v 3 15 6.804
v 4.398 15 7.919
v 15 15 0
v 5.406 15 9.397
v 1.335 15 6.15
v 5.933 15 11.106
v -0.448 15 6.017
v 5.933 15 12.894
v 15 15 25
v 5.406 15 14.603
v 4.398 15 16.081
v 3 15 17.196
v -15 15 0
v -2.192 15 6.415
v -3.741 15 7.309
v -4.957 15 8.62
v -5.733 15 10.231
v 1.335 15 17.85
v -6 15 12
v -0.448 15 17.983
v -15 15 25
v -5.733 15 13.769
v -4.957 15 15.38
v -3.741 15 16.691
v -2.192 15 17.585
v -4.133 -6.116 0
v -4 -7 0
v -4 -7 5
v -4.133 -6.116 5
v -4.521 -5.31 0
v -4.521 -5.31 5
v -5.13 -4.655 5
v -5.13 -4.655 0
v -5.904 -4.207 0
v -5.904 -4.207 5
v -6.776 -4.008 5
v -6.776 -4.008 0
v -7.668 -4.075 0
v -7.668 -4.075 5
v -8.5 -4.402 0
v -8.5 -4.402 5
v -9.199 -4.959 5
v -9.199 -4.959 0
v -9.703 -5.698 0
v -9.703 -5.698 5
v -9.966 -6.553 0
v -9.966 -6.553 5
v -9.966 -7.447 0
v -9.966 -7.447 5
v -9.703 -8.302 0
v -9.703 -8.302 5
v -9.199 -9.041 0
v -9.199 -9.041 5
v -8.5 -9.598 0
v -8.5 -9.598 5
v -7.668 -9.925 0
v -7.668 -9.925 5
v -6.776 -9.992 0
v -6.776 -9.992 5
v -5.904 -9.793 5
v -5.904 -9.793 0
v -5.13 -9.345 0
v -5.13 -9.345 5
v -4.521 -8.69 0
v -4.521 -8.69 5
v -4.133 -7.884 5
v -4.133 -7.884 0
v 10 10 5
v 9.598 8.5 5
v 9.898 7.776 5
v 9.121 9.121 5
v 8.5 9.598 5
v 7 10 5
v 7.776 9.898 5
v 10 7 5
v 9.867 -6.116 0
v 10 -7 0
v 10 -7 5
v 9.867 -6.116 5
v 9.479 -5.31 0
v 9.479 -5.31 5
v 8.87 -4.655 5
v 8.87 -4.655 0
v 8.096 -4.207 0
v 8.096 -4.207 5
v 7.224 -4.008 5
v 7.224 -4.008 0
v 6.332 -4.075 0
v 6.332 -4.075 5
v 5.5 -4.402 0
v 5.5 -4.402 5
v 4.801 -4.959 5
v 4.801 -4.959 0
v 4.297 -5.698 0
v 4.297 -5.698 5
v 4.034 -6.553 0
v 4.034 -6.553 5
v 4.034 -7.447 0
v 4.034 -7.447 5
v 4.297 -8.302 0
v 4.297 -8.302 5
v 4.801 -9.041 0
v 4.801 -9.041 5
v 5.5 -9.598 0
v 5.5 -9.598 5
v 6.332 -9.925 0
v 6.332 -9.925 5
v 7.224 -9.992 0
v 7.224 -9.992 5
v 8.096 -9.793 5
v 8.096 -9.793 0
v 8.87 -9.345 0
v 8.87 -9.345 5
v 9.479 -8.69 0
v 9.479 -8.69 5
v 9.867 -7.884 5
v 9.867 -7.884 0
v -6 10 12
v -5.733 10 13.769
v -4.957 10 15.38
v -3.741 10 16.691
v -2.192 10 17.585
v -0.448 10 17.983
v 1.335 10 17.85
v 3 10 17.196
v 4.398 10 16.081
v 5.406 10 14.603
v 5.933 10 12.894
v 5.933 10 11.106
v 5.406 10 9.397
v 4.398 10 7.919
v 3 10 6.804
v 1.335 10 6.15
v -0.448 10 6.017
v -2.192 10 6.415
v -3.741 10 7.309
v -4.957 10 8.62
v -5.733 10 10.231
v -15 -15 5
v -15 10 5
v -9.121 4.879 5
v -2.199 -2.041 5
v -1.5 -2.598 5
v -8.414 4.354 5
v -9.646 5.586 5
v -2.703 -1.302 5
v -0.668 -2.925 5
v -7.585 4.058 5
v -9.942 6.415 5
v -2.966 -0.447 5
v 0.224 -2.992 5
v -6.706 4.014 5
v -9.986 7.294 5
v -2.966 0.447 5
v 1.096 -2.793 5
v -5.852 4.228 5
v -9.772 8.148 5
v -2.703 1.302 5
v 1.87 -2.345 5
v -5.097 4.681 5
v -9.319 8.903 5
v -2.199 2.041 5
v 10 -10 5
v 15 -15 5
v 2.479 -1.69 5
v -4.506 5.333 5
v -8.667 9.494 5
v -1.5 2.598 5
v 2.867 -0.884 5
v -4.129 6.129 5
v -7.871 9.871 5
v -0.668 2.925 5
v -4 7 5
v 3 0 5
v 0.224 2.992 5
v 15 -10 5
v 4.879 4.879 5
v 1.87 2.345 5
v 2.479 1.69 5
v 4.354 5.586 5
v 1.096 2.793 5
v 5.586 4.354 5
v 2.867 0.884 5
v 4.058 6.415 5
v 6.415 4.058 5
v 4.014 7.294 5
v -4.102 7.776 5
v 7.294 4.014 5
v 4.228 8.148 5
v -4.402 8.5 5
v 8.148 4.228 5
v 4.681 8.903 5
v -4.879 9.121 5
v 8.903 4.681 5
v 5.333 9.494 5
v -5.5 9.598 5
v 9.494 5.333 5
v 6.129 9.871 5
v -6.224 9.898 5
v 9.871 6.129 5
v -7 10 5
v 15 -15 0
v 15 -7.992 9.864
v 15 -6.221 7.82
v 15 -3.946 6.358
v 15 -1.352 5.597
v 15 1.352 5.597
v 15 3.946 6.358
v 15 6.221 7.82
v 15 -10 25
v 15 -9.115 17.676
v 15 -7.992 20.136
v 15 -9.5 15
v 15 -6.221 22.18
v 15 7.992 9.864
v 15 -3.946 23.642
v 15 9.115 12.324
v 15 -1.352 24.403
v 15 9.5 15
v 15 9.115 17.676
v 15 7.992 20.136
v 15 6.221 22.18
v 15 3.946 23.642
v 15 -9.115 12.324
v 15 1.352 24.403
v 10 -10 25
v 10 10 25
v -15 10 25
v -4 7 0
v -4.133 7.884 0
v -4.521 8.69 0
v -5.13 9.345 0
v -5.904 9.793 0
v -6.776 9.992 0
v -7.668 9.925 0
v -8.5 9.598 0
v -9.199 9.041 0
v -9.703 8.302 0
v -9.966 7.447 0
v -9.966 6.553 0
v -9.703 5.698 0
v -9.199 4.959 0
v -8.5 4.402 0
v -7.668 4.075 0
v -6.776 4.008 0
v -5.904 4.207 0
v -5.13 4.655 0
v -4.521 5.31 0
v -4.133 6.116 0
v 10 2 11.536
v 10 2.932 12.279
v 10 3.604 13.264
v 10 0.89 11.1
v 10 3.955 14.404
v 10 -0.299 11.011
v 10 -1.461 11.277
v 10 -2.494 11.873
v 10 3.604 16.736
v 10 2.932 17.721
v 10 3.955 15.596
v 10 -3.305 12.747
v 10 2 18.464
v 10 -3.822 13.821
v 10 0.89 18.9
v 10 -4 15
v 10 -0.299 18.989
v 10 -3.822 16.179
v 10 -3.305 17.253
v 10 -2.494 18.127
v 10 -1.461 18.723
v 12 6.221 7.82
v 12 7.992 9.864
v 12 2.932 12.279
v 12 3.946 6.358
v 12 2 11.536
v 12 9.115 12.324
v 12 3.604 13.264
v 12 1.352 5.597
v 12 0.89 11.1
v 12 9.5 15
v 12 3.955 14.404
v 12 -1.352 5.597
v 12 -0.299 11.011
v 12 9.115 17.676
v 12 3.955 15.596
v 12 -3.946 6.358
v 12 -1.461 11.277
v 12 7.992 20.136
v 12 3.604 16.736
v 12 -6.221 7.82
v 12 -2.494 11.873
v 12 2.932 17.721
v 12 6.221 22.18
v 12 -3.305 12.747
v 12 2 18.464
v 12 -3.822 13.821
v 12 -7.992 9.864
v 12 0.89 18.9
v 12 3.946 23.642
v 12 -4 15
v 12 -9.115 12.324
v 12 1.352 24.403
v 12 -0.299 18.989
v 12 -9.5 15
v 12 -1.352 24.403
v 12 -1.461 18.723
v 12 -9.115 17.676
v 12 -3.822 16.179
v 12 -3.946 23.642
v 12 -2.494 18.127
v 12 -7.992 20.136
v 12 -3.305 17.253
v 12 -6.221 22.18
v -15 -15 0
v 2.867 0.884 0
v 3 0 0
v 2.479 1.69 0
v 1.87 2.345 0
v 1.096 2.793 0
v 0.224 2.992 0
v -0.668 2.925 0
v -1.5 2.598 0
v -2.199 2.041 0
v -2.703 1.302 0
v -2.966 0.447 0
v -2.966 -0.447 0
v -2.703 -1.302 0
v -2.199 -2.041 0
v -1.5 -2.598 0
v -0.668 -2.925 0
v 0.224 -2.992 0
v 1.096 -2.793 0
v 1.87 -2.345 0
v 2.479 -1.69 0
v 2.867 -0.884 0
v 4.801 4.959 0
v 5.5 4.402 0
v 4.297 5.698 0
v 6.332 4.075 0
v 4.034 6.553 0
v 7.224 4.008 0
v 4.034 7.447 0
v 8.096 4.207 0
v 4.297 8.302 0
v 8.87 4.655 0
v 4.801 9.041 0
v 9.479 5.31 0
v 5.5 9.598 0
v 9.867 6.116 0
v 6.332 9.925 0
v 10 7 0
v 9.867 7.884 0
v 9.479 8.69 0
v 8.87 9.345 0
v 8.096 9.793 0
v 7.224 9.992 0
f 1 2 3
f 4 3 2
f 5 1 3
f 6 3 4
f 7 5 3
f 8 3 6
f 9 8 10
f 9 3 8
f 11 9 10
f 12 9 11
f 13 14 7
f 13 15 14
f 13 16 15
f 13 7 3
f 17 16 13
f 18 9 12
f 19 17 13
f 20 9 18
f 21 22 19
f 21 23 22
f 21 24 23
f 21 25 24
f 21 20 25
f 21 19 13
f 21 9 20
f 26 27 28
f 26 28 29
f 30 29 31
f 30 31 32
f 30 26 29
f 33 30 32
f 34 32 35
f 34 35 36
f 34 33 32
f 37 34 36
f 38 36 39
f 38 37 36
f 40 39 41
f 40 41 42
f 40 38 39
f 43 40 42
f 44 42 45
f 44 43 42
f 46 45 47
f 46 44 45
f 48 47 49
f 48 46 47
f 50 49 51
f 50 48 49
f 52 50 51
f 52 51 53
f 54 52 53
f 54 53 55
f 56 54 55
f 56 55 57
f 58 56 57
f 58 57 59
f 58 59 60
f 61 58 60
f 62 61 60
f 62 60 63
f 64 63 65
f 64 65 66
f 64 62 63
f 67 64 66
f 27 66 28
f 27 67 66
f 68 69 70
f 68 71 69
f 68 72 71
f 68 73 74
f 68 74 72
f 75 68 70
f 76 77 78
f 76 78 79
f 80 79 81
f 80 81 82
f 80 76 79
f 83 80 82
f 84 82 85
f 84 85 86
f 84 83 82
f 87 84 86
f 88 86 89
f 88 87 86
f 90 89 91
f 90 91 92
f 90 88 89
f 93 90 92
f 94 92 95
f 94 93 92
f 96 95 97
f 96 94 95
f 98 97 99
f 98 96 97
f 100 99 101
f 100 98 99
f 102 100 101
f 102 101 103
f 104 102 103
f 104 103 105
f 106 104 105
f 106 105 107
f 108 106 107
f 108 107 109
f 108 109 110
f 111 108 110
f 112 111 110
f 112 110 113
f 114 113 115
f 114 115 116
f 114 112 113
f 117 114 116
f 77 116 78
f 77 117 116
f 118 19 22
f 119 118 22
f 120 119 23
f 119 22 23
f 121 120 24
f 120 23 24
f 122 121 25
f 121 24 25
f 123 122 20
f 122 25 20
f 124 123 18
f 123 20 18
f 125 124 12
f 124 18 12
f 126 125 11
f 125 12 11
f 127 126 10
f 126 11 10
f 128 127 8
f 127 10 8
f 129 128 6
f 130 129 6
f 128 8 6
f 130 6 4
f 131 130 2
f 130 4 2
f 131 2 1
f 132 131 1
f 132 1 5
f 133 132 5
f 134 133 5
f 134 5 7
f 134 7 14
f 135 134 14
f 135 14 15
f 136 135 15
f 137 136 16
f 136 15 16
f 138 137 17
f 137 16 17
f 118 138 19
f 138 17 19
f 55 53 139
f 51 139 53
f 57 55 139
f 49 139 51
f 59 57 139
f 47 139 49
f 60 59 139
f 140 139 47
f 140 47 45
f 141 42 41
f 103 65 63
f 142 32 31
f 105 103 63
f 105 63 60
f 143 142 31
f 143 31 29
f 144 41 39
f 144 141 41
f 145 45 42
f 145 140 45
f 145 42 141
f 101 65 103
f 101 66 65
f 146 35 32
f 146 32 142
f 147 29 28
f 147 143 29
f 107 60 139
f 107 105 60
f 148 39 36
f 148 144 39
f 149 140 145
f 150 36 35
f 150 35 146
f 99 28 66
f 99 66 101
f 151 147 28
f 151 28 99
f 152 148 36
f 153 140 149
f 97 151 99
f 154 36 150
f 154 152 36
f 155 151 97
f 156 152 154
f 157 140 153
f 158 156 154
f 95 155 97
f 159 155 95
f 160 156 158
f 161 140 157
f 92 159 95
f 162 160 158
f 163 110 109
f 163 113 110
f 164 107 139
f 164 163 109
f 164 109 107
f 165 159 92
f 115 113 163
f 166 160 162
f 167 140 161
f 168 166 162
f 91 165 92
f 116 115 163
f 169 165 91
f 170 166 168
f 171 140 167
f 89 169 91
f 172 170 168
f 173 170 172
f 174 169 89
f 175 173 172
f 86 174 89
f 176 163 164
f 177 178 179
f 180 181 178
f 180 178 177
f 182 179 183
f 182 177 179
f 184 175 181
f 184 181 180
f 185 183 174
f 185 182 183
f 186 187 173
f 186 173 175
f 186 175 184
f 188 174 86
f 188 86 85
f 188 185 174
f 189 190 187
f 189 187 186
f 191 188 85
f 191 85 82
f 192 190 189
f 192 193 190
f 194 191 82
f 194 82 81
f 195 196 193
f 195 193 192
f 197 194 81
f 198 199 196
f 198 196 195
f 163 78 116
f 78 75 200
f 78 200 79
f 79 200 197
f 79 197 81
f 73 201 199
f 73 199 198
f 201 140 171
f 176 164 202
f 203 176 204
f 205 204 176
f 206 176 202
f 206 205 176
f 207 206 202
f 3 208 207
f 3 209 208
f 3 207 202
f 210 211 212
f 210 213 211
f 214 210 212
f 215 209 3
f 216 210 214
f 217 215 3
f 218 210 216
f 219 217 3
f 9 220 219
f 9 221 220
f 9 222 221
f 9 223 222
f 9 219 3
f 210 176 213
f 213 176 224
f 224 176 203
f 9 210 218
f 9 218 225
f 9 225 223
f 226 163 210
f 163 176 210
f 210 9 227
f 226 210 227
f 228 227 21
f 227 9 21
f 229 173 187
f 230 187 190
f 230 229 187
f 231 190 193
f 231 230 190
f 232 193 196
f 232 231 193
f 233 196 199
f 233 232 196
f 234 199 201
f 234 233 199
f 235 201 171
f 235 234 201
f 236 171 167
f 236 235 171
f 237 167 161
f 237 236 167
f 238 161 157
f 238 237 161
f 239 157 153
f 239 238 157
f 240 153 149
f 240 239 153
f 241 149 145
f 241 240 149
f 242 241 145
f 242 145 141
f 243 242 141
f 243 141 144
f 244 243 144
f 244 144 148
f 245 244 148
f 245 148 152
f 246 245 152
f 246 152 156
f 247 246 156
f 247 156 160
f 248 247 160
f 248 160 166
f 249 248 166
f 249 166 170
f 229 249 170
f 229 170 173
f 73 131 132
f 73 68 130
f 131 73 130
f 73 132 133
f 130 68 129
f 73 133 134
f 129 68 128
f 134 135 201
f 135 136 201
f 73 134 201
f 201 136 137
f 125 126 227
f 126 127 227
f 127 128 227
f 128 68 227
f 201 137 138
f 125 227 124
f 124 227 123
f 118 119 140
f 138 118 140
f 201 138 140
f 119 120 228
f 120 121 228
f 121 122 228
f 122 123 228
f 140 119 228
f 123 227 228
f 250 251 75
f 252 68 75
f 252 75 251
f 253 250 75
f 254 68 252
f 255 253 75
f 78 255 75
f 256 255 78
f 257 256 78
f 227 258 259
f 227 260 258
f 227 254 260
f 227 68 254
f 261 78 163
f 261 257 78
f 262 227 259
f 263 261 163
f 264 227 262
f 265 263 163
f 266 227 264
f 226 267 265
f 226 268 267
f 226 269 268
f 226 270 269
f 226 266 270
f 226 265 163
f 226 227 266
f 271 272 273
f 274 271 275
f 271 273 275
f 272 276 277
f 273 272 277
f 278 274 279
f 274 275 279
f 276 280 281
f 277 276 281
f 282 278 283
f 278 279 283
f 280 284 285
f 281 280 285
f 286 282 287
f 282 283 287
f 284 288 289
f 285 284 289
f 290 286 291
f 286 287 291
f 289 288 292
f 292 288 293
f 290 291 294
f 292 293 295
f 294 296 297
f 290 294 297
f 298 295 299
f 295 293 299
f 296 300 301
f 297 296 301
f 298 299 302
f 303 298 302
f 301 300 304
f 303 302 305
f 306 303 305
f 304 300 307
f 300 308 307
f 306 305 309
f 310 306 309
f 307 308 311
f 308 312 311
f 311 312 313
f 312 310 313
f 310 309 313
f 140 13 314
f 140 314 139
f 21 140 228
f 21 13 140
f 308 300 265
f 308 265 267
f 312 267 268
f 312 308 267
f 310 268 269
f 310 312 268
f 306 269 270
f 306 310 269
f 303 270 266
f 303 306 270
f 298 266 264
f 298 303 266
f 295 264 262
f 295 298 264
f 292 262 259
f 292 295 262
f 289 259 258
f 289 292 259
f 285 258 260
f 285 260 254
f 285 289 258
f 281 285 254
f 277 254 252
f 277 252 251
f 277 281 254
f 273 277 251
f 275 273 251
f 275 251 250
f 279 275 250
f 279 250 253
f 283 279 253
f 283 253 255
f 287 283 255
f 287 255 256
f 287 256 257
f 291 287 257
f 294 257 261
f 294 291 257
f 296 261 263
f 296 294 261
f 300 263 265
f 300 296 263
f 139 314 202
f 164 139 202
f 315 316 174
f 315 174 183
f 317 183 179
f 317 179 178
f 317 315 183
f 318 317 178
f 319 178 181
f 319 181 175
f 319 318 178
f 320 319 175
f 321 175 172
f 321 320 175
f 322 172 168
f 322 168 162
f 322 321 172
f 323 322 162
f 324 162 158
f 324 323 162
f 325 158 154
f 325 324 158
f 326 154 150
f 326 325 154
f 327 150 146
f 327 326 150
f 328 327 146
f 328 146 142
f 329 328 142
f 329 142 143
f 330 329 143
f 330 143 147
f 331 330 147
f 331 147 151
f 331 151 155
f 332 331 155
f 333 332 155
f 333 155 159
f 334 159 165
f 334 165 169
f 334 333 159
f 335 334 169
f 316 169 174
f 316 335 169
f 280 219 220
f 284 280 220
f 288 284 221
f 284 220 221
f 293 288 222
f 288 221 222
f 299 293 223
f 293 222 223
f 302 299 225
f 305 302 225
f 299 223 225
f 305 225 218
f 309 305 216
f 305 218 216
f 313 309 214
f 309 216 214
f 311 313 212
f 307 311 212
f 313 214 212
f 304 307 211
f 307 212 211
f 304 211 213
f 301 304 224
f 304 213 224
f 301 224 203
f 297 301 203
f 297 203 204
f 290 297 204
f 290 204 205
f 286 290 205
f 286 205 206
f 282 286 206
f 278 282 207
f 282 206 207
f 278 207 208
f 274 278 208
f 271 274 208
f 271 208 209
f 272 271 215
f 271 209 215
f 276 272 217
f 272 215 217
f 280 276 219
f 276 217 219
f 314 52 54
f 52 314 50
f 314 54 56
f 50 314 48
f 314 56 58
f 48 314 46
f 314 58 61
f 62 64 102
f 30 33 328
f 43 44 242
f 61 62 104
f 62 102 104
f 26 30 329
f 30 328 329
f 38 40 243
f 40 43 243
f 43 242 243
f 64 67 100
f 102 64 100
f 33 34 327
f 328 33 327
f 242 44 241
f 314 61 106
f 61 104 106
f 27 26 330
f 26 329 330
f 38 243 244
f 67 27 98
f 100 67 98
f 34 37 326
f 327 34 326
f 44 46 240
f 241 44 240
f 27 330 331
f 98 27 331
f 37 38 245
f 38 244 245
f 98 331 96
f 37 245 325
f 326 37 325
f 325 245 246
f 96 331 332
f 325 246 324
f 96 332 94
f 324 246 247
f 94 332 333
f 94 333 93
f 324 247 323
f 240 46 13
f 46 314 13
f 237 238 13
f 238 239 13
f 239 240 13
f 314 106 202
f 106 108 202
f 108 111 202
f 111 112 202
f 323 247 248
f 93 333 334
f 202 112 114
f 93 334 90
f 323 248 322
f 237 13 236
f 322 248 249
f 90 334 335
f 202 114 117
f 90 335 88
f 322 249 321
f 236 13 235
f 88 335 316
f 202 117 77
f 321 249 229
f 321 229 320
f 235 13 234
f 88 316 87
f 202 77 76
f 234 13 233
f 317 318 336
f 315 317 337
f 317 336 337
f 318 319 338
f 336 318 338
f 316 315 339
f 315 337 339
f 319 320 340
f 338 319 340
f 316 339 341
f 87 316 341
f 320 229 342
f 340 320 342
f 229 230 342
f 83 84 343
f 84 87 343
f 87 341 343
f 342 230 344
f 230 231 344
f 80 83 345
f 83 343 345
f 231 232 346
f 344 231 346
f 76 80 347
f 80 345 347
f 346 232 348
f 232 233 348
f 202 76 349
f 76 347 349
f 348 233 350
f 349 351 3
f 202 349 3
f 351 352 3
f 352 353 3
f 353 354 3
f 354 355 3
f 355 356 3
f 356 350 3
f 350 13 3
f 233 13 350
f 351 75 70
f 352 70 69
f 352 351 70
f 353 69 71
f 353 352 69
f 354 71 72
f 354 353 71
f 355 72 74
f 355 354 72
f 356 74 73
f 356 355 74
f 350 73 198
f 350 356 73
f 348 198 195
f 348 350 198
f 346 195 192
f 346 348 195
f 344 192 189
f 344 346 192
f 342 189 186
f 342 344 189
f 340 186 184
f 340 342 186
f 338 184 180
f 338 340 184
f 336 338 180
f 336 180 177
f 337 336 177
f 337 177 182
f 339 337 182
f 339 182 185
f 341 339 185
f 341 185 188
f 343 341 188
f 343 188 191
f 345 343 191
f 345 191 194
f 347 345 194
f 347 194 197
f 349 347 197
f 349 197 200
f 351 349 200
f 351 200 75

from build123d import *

# Parameters (mm, degrees)
F0_W     = 30
F0_H     = 30
F0_R     = 3
F1_DEPTH = 5
F2_W     = 25
F2_H     = 20
F2_R     = 9.5
F3_DEPTH = 3
F4_W     = 25
F4_H     = 20
F4_R     = 4
F5_DEPTH = 2
F6_W     = 25
F6_H     = 20
F6_R     = 6
F7_DEPTH = 5


with BuildPart() as f1:
    # F0 (on Top) → F1 (new body)
    with BuildSketch(Plane.XY):
        Rectangle(F0_W, F0_H)
        with Locations((-7, -7)):
            Circle(F0_R, mode=Mode.SUBTRACT)
        with Locations((7, -7)):
            Circle(F0_R, mode=Mode.SUBTRACT)
        with Locations((-7, 7)):
            Circle(F0_R, mode=Mode.SUBTRACT)
        Circle(F0_R, mode=Mode.SUBTRACT)
        with Locations((7, 7)):
            Circle(F0_R, mode=Mode.SUBTRACT)
    extrude(amount=F1_DEPTH)

    # F2 (on face) → F3 (join)
    with BuildSketch(Plane.YZ.offset(15)):
        with Locations((2.5, 15)):
            Rectangle(F2_W, F2_H)
        with Locations((0, 15)):
            Circle(F2_R, mode=Mode.SUBTRACT)
    extrude(amount=-F3_DEPTH)

    # F4 (on face) → F5 (join)
    with BuildSketch(Plane(origin=(12, 0, 0), x_dir=(0, -1, 0), z_dir=(-1, 0, 0))):
        with Locations((-2.5, 15)):
            Rectangle(F4_W, F4_H)
        with Locations((0, 15)):
            Circle(F4_R, mode=Mode.SUBTRACT)
    extrude(amount=F5_DEPTH)

    # F6 (on face) → F7 (join)
    with BuildSketch(Plane(origin=(0, 15, 0), x_dir=(-1, 0, 0), z_dir=(0, 1, 0))):
        with Locations((2.5, 15)):
            Rectangle(F6_W, F6_H)
        with Locations((0, 12)):
            Circle(F6_R, mode=Mode.SUBTRACT)
    extrude(amount=-F7_DEPTH)


solid = f1.part
